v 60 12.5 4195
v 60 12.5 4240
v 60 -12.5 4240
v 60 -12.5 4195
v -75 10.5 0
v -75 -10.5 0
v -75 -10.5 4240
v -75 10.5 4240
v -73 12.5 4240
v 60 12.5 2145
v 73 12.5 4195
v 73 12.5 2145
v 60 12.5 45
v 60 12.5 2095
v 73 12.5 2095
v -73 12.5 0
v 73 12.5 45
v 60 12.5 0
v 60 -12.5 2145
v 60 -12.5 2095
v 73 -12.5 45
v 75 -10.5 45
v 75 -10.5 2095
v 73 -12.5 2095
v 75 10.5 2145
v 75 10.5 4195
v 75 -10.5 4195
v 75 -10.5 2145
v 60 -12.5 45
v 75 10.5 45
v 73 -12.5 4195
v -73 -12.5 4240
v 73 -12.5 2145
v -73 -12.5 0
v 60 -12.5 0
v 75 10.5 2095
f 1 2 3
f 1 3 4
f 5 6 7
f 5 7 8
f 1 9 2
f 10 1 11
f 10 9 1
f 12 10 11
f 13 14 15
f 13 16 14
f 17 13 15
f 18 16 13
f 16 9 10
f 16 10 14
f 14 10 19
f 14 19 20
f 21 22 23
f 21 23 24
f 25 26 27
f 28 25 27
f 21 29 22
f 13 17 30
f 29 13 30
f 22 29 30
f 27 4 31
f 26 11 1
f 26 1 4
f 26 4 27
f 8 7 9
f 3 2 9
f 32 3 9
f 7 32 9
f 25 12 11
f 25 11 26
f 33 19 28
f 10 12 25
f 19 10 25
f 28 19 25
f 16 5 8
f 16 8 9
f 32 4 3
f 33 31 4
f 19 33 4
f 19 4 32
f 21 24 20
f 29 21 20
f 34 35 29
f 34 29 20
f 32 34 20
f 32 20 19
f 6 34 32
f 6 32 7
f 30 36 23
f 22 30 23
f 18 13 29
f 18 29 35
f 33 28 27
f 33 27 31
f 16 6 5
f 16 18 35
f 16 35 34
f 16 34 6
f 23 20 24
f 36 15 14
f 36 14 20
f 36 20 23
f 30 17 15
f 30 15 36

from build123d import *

# Parameters (mm, degrees)
EXTRUDE_1_DEPTH     = 4240
SKETCH_2_W          = 15
SKETCH_2_H          = 45
SKETCH_2_H_2        = 50
CUT_EXTRUDE_1_DEPTH = 4241.736964255


with BuildPart() as part:
    # Эскиз1 → Бобышка-Вытянуть1 (new body)
    with BuildSketch(Plane.XY):
        Polygon((-75, 10.5), (-73, 12.5), (73, 12.5), (75, 10.5), (75, -10.5), (73, -12.5), (-73, -12.5), (-75, -10.5), align=None)
    extrude(amount=EXTRUDE_1_DEPTH)

    # Эскиз2 → Вырез-Вытянуть1 (cut, through all)
    with BuildSketch(Plane(origin=(0, 12.5, 0), x_dir=(1, 0, 0), z_dir=(0, 1, 0))):
        with Locations((67.5, -22.5)):
            Rectangle(SKETCH_2_W, SKETCH_2_H)
        with Locations((67.5, -4217.5)):
            Rectangle(SKETCH_2_W, SKETCH_2_H)
        with Locations((67.5, -2120)):
            Rectangle(SKETCH_2_W, SKETCH_2_H_2)
    extrude(amount=-CUT_EXTRUDE_1_DEPTH, mode=Mode.SUBTRACT)


solid = part.part
